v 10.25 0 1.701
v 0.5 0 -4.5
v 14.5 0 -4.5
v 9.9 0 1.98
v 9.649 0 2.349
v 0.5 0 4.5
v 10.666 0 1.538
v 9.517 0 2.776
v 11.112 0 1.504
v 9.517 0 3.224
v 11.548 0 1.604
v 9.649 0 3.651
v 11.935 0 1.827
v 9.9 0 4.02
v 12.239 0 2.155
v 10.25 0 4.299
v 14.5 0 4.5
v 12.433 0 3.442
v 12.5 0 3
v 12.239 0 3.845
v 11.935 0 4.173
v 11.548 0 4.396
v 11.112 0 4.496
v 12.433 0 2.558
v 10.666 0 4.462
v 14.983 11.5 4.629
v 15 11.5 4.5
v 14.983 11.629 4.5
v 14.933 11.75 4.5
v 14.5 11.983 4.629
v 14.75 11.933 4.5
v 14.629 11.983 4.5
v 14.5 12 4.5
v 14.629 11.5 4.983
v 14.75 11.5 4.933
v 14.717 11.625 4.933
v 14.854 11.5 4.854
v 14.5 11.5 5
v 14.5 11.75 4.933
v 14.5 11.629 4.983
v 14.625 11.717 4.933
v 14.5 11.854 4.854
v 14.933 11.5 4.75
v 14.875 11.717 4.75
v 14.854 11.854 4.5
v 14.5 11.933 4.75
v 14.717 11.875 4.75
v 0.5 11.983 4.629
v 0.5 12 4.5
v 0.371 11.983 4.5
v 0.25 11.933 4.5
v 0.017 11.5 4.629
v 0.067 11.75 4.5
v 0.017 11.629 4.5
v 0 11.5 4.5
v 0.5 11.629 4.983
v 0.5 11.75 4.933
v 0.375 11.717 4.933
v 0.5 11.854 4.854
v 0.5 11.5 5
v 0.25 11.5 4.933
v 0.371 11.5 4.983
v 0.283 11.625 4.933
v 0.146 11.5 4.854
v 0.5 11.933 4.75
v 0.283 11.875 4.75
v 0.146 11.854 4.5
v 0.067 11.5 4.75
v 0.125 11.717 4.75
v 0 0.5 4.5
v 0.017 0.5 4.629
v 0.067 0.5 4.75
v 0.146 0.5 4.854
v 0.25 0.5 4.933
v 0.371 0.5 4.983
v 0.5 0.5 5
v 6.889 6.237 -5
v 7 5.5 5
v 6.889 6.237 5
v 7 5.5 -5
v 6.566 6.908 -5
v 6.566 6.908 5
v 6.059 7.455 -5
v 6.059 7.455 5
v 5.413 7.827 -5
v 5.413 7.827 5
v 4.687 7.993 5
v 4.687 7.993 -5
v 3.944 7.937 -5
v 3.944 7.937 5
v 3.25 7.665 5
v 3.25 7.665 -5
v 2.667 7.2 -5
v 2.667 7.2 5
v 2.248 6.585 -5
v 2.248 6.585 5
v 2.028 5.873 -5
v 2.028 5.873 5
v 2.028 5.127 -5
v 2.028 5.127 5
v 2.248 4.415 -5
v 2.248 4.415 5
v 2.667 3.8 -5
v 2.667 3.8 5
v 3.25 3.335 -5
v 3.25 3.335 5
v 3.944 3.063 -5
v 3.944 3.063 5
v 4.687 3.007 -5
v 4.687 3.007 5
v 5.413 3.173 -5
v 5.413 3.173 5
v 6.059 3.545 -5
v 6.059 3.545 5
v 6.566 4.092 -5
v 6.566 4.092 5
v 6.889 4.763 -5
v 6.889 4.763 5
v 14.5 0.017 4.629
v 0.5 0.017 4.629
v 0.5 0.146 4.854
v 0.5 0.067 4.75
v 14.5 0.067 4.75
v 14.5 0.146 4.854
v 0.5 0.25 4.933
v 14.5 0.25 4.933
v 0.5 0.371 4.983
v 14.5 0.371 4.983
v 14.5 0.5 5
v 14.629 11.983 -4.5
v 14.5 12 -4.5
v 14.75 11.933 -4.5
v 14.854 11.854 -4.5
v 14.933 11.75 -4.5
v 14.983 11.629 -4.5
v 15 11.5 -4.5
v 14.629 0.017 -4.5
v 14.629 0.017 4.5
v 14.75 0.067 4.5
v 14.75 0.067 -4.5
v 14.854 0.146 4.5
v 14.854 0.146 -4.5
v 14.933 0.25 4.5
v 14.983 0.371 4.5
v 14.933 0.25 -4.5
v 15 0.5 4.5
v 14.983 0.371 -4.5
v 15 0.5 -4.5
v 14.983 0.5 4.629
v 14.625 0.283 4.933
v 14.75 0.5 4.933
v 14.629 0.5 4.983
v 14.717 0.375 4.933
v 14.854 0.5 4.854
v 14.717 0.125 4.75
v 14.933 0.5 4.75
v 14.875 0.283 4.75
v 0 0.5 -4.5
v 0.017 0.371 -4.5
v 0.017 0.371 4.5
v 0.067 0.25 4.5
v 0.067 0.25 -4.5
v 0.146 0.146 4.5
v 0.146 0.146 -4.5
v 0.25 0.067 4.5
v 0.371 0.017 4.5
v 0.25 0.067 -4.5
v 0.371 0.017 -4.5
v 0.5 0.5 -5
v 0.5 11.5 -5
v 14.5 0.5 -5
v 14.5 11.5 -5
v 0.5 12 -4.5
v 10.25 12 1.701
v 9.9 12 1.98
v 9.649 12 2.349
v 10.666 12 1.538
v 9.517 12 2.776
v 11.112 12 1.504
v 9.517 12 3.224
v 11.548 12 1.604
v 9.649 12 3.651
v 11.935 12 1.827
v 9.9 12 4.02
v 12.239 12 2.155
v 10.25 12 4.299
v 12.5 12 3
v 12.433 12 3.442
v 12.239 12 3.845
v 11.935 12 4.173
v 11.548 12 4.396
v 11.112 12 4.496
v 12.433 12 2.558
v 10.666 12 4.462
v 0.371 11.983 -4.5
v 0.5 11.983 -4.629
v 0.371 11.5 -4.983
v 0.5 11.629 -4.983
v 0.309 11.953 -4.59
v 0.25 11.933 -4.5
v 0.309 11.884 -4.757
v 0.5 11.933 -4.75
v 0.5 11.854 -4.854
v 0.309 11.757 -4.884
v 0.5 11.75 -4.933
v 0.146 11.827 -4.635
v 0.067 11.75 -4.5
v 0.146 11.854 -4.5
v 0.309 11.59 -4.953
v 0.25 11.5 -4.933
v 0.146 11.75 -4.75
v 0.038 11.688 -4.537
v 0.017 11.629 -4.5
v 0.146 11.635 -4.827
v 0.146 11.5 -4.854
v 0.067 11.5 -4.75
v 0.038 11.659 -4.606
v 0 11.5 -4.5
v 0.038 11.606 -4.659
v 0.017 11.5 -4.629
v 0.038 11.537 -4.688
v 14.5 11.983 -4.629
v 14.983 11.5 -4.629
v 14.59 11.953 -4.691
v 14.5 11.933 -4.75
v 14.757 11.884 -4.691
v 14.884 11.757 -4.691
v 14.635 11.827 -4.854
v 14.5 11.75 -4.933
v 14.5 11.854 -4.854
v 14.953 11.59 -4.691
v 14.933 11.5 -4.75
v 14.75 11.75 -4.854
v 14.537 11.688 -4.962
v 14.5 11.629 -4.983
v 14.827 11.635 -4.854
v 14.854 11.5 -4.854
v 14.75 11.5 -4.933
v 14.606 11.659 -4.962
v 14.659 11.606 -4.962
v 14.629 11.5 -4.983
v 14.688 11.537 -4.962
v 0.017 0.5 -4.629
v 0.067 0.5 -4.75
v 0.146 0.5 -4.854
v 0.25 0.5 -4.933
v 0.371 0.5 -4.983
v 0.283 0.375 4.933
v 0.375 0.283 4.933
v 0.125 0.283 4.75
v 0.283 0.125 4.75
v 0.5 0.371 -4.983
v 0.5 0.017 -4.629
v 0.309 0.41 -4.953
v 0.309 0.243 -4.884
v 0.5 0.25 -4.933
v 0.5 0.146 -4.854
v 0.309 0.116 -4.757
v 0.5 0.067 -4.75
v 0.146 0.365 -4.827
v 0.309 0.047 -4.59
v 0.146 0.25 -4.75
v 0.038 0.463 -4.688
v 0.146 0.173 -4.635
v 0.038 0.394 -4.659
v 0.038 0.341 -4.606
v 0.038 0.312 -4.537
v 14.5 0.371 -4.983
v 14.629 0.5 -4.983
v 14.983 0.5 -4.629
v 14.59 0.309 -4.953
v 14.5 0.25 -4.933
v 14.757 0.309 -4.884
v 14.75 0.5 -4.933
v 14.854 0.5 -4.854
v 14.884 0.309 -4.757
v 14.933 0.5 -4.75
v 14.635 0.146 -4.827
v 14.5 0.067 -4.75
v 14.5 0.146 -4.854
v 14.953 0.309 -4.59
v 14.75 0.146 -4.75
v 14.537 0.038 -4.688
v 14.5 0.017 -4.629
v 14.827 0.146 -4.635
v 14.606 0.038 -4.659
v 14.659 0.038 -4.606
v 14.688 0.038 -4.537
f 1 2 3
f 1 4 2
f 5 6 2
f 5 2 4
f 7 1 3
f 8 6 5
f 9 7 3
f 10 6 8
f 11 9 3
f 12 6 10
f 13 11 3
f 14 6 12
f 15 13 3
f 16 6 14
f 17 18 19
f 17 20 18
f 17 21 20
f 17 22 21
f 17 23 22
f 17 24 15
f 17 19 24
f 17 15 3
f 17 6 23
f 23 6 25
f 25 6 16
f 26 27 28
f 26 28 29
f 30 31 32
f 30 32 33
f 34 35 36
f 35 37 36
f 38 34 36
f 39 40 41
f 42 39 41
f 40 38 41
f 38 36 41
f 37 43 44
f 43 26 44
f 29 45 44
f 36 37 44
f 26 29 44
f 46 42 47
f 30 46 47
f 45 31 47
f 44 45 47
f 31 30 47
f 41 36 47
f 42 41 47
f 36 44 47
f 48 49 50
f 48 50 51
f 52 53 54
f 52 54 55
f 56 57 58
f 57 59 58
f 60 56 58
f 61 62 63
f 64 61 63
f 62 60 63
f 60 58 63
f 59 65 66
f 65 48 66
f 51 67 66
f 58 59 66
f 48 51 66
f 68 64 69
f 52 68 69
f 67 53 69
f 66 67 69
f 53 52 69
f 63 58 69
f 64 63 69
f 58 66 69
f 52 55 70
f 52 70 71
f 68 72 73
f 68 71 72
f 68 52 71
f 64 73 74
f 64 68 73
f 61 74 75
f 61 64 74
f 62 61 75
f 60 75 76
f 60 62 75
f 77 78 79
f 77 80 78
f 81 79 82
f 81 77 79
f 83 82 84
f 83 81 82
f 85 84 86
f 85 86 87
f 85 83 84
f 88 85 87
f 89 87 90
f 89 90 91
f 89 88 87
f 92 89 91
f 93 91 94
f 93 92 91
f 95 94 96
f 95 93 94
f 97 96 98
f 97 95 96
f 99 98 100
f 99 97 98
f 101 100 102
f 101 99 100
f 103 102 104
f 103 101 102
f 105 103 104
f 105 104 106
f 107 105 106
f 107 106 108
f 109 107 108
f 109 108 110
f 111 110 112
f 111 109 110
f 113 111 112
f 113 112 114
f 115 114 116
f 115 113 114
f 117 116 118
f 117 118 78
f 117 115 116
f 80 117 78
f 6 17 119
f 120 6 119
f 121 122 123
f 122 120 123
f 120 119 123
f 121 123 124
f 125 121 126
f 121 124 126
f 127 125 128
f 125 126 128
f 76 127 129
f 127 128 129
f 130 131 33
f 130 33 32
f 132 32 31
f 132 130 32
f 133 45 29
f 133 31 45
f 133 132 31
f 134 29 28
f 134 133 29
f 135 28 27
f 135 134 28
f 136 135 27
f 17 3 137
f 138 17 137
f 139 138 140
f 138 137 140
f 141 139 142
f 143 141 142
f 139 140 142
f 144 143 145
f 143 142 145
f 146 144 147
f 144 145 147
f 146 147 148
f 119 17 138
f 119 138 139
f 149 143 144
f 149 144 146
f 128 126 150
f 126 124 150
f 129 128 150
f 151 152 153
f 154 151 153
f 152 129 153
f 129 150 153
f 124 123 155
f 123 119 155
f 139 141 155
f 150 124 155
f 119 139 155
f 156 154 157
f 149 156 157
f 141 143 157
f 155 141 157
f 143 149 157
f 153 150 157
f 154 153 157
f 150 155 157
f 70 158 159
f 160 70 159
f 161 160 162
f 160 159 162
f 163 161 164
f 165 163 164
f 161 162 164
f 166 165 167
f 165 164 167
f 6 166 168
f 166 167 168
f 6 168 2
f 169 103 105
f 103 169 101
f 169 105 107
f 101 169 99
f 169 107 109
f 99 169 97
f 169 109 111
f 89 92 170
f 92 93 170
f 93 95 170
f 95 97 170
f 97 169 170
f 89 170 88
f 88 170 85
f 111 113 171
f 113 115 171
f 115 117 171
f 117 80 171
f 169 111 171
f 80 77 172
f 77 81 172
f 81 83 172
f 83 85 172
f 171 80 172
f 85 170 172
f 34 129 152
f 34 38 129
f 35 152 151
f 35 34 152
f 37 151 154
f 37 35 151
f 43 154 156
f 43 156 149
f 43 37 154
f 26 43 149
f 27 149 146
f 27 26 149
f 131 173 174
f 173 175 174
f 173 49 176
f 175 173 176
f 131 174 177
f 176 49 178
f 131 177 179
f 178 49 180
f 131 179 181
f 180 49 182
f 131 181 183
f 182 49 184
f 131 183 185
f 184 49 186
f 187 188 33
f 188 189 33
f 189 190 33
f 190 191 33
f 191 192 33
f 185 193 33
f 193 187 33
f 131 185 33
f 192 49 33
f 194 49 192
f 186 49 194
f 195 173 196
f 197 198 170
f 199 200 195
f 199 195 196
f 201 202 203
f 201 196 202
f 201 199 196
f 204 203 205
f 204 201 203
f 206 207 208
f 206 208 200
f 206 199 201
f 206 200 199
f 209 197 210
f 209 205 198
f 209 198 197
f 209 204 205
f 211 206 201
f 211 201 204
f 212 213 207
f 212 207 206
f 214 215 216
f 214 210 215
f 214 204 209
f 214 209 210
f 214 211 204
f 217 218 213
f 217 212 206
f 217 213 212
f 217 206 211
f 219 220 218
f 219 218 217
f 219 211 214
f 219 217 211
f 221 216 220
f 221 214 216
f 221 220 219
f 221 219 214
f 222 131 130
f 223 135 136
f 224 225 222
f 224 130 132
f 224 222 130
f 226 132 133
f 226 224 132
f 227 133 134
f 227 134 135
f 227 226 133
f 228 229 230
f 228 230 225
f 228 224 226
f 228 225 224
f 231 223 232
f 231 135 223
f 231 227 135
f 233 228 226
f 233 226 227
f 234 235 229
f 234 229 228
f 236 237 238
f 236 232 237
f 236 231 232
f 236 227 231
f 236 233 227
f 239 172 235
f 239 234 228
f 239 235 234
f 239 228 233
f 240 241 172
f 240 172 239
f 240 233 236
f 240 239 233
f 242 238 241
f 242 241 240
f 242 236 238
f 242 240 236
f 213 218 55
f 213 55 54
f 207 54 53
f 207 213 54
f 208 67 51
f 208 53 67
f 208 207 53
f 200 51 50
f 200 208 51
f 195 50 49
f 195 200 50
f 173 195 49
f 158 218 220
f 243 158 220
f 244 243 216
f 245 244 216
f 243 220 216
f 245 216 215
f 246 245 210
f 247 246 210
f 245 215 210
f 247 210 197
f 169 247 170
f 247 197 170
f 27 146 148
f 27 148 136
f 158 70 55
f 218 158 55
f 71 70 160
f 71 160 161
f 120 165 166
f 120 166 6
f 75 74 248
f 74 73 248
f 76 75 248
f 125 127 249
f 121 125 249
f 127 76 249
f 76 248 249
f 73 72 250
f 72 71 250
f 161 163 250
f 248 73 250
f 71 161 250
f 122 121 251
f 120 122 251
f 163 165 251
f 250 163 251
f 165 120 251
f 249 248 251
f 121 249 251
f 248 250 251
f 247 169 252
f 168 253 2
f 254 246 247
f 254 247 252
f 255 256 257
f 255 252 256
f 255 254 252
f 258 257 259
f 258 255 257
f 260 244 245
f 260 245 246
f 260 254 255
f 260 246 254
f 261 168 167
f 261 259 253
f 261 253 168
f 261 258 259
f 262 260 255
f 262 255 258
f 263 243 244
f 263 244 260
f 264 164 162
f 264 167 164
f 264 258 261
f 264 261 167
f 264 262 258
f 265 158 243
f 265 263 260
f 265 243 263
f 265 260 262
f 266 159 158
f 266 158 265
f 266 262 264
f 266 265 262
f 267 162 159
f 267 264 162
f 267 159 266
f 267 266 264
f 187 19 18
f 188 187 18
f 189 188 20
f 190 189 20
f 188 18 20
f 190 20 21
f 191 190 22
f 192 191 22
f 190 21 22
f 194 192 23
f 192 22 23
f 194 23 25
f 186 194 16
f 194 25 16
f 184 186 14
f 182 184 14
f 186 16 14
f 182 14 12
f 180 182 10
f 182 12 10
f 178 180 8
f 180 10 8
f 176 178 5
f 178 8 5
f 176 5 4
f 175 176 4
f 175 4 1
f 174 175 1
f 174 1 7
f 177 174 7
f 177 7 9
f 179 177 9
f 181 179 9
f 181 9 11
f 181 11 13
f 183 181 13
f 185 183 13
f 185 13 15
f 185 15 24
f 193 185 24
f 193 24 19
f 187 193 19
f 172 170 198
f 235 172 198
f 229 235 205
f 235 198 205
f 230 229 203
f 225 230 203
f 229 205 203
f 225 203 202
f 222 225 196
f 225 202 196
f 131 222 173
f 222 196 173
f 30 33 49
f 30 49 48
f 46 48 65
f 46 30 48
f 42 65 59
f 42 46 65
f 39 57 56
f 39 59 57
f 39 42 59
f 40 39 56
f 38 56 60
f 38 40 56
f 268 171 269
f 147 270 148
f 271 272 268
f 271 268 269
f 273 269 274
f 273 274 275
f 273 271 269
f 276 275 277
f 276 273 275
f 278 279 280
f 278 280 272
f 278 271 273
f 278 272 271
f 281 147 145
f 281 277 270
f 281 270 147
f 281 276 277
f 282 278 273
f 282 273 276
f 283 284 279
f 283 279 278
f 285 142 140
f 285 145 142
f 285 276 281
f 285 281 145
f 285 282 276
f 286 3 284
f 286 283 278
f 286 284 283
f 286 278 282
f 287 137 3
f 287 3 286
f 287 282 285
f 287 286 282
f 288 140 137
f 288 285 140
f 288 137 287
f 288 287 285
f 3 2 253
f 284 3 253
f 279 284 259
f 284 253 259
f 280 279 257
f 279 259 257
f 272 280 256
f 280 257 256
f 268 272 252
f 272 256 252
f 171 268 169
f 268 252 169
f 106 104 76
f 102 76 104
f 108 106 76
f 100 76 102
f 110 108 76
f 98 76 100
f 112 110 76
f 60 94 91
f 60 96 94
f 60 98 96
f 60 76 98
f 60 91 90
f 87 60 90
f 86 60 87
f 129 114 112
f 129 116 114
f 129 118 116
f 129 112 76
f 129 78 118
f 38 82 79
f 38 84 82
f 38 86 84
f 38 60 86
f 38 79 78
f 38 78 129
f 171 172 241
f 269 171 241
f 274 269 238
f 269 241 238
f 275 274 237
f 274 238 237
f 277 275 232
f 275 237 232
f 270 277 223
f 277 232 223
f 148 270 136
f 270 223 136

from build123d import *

# Parameters (mm, degrees)
F0_W         = 15
F0_H         = 12
F0_R         = 2.5
F1_DEPTH     = 5
F2_R         = 1.5
F3_DEPTH     = 12.001
F4_R         = 0.49999
F5_T1_DEPTH  = 9.5
F5_T3_DEPTH  = 11
F5_T5_DEPTH  = 14
F5_T8_ANGLE  = 90
F5_T10_ANGLE = 90
F5_T12_ANGLE = 90
F5_T14_ANGLE = 90
F5_S17_W     = 0.5
F5_S17_H     = 0.5
F5_T18_DEPTH = 0.5
F5_S23_W     = 0.5
F5_S23_H     = 0.5
F5_T24_DEPTH = 0.5
F5_S29_W     = 0.5
F5_S29_H     = 0.5
F5_T30_DEPTH = 0.5
F5_S35_W     = 0.5
F5_S35_H     = 0.5
F5_T36_DEPTH = 0.5


# Not quite as in the source:
# - a fillet or chamfer that OpenCascade refuses, or shapes differently, is made with other operations: its cross-section is extruded or revolved along the edge and cut away or added
# - a fillet or chamfer is up to 0.001 mm smaller than in the source, because OpenCascade refuses the exact size


with BuildPart() as f1:
    # F0 (on Top) → F1 (new body, symmetric)
    with BuildSketch(Plane.XY):
        with Locations((7.5, 6)):
            Rectangle(F0_W, F0_H)
        with Locations((4.5, 5.5)):
            Circle(F0_R, mode=Mode.SUBTRACT)
    extrude(amount=F1_DEPTH, both=True)

    # F2 (on face) → F3 (cut, through all)
    with BuildSketch(Plane.XZ):
        with Locations((11, 3)):
            Circle(F2_R)
    extrude(amount=-F3_DEPTH, mode=Mode.SUBTRACT)

    # F4 (radius 0.5 in the source; OpenCascade refuses exactly that, so slightly less here)
    f4_edges = [f1.edges().sort_by_distance(p)[0] for p in [
        (7.5, 0, 5),
        (15, 6, 5),
        (7.5, 12, 5),
        (0, 6, 5),
    ]]
    fillet(f4_edges, radius=F4_R)

    # F5: fillet of radius 0.5 on 8 edges, made by hand

    # F5_s2 → F5_t1 (cut)
    with BuildSketch(Plane.XY.offset(-4.5)):
        with BuildLine():
            ThreePointArc((14.5, 0), (14.8535533906, 0.1464466094), (15, 0.5))
            Line((15, 0.5), (15, 0))
            Line((15, 0), (14.5, 0))
        make_face()
        with BuildLine():
            ThreePointArc((0, 0.5), (0.1464466094, 0.1464466094), (0.5, 0))
            Line((0.5, 0), (0, 0))
            Line((0, 0), (0, 0.5))
        make_face()
        with BuildLine():
            ThreePointArc((0, 11.5), (0.1464466094, 11.8535533906), (0.5, 12))
            Line((0.5, 12), (0, 12))
            Line((0, 12), (0, 11.5))
        make_face()
        with BuildLine():
            ThreePointArc((14.5, 12), (14.8535533906, 11.8535533906), (15, 11.5))
            Line((15, 11.5), (15, 12))
            Line((15, 12), (14.5, 12))
        make_face()
    extrude(amount=F5_T1_DEPTH, mode=Mode.SUBTRACT)

    # F5_s4 → F5_t3 (cut)
    with BuildSketch(Plane.XZ.offset(-11.5)):
        with BuildLine():
            ThreePointArc((0, -4.5), (0.1464466094, -4.8535533906), (0.5, -5))
            Line((0.5, -5), (0, -5))
            Line((0, -5), (0, -4.5))
        make_face()
        with BuildLine():
            ThreePointArc((14.5, -5), (14.8535533906, -4.8535533906), (15, -4.5))
            Line((15, -4.5), (15, -5))
            Line((15, -5), (14.5, -5))
        make_face()
    extrude(amount=F5_T3_DEPTH, mode=Mode.SUBTRACT)

    # F5_s6 → F5_t5 (cut)
    with BuildSketch(Plane.YZ.offset(0.5)):
        with BuildLine():
            ThreePointArc((11.5, -5), (11.8535533906, -4.8535533906), (12, -4.5))
            Line((12, -4.5), (12, -5))
            Line((12, -5), (11.5, -5))
        make_face()
        with BuildLine():
            ThreePointArc((0, -4.5), (0.1464466094, -4.8535533906), (0.5, -5))
            Line((0.5, -5), (0, -5))
            Line((0, -5), (0, -4.5))
        make_face()
    extrude(amount=F5_T5_DEPTH, mode=Mode.SUBTRACT)

    # F5_s7 → F5_t8 (revolve, cut)
    with BuildSketch(Plane.XZ.offset(-11.5)):
        with BuildLine():
            ThreePointArc((14.50001, 5), (14.8535563195, 4.8535563195), (15, 4.50001))
            Line((15, 4.50001), (15, 5))
            Line((15, 5), (14.50001, 5))
        make_face()
    revolve(axis=Axis((14.5, 11.5, 5), (0, 0, 1)), revolution_arc=F5_T8_ANGLE, mode=Mode.SUBTRACT)

    # F5_s9 → F5_t10 (revolve, cut)
    with BuildSketch(Plane.YZ.offset(0.5)):
        with BuildLine():
            ThreePointArc((11.50001, 5), (11.8535563195, 4.8535563195), (12, 4.50001))
            Line((12, 4.50001), (12, 5))
            Line((12, 5), (11.50001, 5))
        make_face()
    revolve(axis=Axis((0.5, 11.5, 5), (0, 0, 1)), revolution_arc=F5_T10_ANGLE, mode=Mode.SUBTRACT)

    # F5_s11 → F5_t12 (revolve, cut)
    with BuildSketch(Plane.XZ.offset(-0.5)):
        with BuildLine():
            ThreePointArc((0.49999, 5), (0.1464436805, 4.8535563195), (0, 4.50001))
            Line((0, 4.50001), (0, 5))
            Line((0, 5), (0.49999, 5))
        make_face()
    revolve(axis=Axis((0.5, 0.5, 5), (0, 0, 1)), revolution_arc=F5_T12_ANGLE, mode=Mode.SUBTRACT)

    # F5_s13 → F5_t14 (revolve, cut)
    with BuildSketch(Plane.YZ.offset(14.5)):
        with BuildLine():
            ThreePointArc((0.49999, 5), (0.1464436805, 4.8535563195), (0, 4.50001))
            Line((0, 4.50001), (0, 5))
            Line((0, 5), (0.49999, 5))
        make_face()
    revolve(axis=Axis((14.5, 0.5, 5), (0, 0, 1)), revolution_arc=F5_T14_ANGLE, mode=Mode.SUBTRACT)


with BuildPart() as f5_tool16:
    # F5_s17 → F5_t18 (new body)
    with BuildSketch(Plane.XZ.offset(-0.5)):
        with Locations((14.75, -4.75)):
            Rectangle(F5_S17_W, F5_S17_H)
    extrude(amount=F5_T18_DEPTH)

    # F5_s19 → F5_t20 (revolve, cut)
    with BuildSketch(Plane(origin=(14.5, 0.5, -4.5), x_dir=(-0.7071067812, 0, 0.7071067812), z_dir=(0.7071067812, 0, 0.7071067812))):
        with BuildLine():
            ThreePointArc((0, -0.5), (0.5, 0), (0, 0.5))
            Line((0, 0.5), (0, -0.5))
        make_face()
    revolve(axis=Axis((14.5, 0.5, -4.5), (0, -1, 0)), mode=Mode.SUBTRACT)


with BuildPart() as f1_1:
    add(f1.part)

    # F5_t15: cut F5_tool16
    add(f5_tool16.part, mode=Mode.SUBTRACT)


with BuildPart() as f5_tool22:
    # F5_s23 → F5_t24 (new body)
    with BuildSketch(Plane.YZ.offset(0.5)):
        with Locations((0.25, -4.75)):
            Rectangle(F5_S23_W, F5_S23_H)
    extrude(amount=-F5_T24_DEPTH)

    # F5_s25 → F5_t26 (revolve, cut)
    with BuildSketch(Plane(origin=(0.5, 0.5, -4.5), x_dir=(0, 0.7071067812, 0.7071067812), z_dir=(0, -0.7071067812, 0.7071067812))):
        with BuildLine():
            ThreePointArc((0, -0.5), (0.5, 0), (0, 0.5))
            Line((0, 0.5), (0, -0.5))
        make_face()
    revolve(axis=Axis((0.5, 0.5, -4.5), (-1, 0, 0)), mode=Mode.SUBTRACT)


with BuildPart() as f1_2:
    add(f1_1.part)

    # F5_t21: cut F5_tool22
    add(f5_tool22.part, mode=Mode.SUBTRACT)


with BuildPart() as f5_tool28:
    # F5_s29 → F5_t30 (new body)
    with BuildSketch(Plane.YZ.offset(0.5)):
        with Locations((11.75, -4.75)):
            Rectangle(F5_S29_W, F5_S29_H)
    extrude(amount=-F5_T30_DEPTH)

    # F5_s31 → F5_t32 (revolve, cut)
    with BuildSketch(Plane(origin=(0.5, 11.5, -4.5), x_dir=(0, -0.7071067812, 0.7071067812), z_dir=(0, -0.7071067812, -0.7071067812))):
        with BuildLine():
            ThreePointArc((0, -0.5), (0.5, 0), (0, 0.5))
            Line((0, 0.5), (0, -0.5))
        make_face()
    revolve(axis=Axis((0.5, 11.5, -4.5), (-1, 0, 0)), mode=Mode.SUBTRACT)


with BuildPart() as f1_3:
    add(f1_2.part)

    # F5_t27: cut F5_tool28
    add(f5_tool28.part, mode=Mode.SUBTRACT)


with BuildPart() as f5_tool34:
    # F5_s35 → F5_t36 (new body)
    with BuildSketch(Plane.XY.offset(-4.5)):
        with Locations((14.75, 11.75)):
            Rectangle(F5_S35_W, F5_S35_H)
    extrude(amount=-F5_T36_DEPTH)

    # F5_s37 → F5_t38 (revolve, cut)
    with BuildSketch(Plane(origin=(14.5, 11.5, -4.5), x_dir=(-0.7071067812, -0.7071067812, 0), z_dir=(0.7071067812, -0.7071067812, 0))):
        with BuildLine():
            ThreePointArc((0, -0.5), (0.5, 0), (0, 0.5))
            Line((0, 0.5), (0, -0.5))
        make_face()
    revolve(axis=Axis((14.5, 11.5, -4.5), (0, 0, -1)), mode=Mode.SUBTRACT)


with BuildPart() as f1_4:
    add(f1_3.part)

    # F5_t33: cut F5_tool34
    add(f5_tool34.part, mode=Mode.SUBTRACT)


solid = f1_4.part
